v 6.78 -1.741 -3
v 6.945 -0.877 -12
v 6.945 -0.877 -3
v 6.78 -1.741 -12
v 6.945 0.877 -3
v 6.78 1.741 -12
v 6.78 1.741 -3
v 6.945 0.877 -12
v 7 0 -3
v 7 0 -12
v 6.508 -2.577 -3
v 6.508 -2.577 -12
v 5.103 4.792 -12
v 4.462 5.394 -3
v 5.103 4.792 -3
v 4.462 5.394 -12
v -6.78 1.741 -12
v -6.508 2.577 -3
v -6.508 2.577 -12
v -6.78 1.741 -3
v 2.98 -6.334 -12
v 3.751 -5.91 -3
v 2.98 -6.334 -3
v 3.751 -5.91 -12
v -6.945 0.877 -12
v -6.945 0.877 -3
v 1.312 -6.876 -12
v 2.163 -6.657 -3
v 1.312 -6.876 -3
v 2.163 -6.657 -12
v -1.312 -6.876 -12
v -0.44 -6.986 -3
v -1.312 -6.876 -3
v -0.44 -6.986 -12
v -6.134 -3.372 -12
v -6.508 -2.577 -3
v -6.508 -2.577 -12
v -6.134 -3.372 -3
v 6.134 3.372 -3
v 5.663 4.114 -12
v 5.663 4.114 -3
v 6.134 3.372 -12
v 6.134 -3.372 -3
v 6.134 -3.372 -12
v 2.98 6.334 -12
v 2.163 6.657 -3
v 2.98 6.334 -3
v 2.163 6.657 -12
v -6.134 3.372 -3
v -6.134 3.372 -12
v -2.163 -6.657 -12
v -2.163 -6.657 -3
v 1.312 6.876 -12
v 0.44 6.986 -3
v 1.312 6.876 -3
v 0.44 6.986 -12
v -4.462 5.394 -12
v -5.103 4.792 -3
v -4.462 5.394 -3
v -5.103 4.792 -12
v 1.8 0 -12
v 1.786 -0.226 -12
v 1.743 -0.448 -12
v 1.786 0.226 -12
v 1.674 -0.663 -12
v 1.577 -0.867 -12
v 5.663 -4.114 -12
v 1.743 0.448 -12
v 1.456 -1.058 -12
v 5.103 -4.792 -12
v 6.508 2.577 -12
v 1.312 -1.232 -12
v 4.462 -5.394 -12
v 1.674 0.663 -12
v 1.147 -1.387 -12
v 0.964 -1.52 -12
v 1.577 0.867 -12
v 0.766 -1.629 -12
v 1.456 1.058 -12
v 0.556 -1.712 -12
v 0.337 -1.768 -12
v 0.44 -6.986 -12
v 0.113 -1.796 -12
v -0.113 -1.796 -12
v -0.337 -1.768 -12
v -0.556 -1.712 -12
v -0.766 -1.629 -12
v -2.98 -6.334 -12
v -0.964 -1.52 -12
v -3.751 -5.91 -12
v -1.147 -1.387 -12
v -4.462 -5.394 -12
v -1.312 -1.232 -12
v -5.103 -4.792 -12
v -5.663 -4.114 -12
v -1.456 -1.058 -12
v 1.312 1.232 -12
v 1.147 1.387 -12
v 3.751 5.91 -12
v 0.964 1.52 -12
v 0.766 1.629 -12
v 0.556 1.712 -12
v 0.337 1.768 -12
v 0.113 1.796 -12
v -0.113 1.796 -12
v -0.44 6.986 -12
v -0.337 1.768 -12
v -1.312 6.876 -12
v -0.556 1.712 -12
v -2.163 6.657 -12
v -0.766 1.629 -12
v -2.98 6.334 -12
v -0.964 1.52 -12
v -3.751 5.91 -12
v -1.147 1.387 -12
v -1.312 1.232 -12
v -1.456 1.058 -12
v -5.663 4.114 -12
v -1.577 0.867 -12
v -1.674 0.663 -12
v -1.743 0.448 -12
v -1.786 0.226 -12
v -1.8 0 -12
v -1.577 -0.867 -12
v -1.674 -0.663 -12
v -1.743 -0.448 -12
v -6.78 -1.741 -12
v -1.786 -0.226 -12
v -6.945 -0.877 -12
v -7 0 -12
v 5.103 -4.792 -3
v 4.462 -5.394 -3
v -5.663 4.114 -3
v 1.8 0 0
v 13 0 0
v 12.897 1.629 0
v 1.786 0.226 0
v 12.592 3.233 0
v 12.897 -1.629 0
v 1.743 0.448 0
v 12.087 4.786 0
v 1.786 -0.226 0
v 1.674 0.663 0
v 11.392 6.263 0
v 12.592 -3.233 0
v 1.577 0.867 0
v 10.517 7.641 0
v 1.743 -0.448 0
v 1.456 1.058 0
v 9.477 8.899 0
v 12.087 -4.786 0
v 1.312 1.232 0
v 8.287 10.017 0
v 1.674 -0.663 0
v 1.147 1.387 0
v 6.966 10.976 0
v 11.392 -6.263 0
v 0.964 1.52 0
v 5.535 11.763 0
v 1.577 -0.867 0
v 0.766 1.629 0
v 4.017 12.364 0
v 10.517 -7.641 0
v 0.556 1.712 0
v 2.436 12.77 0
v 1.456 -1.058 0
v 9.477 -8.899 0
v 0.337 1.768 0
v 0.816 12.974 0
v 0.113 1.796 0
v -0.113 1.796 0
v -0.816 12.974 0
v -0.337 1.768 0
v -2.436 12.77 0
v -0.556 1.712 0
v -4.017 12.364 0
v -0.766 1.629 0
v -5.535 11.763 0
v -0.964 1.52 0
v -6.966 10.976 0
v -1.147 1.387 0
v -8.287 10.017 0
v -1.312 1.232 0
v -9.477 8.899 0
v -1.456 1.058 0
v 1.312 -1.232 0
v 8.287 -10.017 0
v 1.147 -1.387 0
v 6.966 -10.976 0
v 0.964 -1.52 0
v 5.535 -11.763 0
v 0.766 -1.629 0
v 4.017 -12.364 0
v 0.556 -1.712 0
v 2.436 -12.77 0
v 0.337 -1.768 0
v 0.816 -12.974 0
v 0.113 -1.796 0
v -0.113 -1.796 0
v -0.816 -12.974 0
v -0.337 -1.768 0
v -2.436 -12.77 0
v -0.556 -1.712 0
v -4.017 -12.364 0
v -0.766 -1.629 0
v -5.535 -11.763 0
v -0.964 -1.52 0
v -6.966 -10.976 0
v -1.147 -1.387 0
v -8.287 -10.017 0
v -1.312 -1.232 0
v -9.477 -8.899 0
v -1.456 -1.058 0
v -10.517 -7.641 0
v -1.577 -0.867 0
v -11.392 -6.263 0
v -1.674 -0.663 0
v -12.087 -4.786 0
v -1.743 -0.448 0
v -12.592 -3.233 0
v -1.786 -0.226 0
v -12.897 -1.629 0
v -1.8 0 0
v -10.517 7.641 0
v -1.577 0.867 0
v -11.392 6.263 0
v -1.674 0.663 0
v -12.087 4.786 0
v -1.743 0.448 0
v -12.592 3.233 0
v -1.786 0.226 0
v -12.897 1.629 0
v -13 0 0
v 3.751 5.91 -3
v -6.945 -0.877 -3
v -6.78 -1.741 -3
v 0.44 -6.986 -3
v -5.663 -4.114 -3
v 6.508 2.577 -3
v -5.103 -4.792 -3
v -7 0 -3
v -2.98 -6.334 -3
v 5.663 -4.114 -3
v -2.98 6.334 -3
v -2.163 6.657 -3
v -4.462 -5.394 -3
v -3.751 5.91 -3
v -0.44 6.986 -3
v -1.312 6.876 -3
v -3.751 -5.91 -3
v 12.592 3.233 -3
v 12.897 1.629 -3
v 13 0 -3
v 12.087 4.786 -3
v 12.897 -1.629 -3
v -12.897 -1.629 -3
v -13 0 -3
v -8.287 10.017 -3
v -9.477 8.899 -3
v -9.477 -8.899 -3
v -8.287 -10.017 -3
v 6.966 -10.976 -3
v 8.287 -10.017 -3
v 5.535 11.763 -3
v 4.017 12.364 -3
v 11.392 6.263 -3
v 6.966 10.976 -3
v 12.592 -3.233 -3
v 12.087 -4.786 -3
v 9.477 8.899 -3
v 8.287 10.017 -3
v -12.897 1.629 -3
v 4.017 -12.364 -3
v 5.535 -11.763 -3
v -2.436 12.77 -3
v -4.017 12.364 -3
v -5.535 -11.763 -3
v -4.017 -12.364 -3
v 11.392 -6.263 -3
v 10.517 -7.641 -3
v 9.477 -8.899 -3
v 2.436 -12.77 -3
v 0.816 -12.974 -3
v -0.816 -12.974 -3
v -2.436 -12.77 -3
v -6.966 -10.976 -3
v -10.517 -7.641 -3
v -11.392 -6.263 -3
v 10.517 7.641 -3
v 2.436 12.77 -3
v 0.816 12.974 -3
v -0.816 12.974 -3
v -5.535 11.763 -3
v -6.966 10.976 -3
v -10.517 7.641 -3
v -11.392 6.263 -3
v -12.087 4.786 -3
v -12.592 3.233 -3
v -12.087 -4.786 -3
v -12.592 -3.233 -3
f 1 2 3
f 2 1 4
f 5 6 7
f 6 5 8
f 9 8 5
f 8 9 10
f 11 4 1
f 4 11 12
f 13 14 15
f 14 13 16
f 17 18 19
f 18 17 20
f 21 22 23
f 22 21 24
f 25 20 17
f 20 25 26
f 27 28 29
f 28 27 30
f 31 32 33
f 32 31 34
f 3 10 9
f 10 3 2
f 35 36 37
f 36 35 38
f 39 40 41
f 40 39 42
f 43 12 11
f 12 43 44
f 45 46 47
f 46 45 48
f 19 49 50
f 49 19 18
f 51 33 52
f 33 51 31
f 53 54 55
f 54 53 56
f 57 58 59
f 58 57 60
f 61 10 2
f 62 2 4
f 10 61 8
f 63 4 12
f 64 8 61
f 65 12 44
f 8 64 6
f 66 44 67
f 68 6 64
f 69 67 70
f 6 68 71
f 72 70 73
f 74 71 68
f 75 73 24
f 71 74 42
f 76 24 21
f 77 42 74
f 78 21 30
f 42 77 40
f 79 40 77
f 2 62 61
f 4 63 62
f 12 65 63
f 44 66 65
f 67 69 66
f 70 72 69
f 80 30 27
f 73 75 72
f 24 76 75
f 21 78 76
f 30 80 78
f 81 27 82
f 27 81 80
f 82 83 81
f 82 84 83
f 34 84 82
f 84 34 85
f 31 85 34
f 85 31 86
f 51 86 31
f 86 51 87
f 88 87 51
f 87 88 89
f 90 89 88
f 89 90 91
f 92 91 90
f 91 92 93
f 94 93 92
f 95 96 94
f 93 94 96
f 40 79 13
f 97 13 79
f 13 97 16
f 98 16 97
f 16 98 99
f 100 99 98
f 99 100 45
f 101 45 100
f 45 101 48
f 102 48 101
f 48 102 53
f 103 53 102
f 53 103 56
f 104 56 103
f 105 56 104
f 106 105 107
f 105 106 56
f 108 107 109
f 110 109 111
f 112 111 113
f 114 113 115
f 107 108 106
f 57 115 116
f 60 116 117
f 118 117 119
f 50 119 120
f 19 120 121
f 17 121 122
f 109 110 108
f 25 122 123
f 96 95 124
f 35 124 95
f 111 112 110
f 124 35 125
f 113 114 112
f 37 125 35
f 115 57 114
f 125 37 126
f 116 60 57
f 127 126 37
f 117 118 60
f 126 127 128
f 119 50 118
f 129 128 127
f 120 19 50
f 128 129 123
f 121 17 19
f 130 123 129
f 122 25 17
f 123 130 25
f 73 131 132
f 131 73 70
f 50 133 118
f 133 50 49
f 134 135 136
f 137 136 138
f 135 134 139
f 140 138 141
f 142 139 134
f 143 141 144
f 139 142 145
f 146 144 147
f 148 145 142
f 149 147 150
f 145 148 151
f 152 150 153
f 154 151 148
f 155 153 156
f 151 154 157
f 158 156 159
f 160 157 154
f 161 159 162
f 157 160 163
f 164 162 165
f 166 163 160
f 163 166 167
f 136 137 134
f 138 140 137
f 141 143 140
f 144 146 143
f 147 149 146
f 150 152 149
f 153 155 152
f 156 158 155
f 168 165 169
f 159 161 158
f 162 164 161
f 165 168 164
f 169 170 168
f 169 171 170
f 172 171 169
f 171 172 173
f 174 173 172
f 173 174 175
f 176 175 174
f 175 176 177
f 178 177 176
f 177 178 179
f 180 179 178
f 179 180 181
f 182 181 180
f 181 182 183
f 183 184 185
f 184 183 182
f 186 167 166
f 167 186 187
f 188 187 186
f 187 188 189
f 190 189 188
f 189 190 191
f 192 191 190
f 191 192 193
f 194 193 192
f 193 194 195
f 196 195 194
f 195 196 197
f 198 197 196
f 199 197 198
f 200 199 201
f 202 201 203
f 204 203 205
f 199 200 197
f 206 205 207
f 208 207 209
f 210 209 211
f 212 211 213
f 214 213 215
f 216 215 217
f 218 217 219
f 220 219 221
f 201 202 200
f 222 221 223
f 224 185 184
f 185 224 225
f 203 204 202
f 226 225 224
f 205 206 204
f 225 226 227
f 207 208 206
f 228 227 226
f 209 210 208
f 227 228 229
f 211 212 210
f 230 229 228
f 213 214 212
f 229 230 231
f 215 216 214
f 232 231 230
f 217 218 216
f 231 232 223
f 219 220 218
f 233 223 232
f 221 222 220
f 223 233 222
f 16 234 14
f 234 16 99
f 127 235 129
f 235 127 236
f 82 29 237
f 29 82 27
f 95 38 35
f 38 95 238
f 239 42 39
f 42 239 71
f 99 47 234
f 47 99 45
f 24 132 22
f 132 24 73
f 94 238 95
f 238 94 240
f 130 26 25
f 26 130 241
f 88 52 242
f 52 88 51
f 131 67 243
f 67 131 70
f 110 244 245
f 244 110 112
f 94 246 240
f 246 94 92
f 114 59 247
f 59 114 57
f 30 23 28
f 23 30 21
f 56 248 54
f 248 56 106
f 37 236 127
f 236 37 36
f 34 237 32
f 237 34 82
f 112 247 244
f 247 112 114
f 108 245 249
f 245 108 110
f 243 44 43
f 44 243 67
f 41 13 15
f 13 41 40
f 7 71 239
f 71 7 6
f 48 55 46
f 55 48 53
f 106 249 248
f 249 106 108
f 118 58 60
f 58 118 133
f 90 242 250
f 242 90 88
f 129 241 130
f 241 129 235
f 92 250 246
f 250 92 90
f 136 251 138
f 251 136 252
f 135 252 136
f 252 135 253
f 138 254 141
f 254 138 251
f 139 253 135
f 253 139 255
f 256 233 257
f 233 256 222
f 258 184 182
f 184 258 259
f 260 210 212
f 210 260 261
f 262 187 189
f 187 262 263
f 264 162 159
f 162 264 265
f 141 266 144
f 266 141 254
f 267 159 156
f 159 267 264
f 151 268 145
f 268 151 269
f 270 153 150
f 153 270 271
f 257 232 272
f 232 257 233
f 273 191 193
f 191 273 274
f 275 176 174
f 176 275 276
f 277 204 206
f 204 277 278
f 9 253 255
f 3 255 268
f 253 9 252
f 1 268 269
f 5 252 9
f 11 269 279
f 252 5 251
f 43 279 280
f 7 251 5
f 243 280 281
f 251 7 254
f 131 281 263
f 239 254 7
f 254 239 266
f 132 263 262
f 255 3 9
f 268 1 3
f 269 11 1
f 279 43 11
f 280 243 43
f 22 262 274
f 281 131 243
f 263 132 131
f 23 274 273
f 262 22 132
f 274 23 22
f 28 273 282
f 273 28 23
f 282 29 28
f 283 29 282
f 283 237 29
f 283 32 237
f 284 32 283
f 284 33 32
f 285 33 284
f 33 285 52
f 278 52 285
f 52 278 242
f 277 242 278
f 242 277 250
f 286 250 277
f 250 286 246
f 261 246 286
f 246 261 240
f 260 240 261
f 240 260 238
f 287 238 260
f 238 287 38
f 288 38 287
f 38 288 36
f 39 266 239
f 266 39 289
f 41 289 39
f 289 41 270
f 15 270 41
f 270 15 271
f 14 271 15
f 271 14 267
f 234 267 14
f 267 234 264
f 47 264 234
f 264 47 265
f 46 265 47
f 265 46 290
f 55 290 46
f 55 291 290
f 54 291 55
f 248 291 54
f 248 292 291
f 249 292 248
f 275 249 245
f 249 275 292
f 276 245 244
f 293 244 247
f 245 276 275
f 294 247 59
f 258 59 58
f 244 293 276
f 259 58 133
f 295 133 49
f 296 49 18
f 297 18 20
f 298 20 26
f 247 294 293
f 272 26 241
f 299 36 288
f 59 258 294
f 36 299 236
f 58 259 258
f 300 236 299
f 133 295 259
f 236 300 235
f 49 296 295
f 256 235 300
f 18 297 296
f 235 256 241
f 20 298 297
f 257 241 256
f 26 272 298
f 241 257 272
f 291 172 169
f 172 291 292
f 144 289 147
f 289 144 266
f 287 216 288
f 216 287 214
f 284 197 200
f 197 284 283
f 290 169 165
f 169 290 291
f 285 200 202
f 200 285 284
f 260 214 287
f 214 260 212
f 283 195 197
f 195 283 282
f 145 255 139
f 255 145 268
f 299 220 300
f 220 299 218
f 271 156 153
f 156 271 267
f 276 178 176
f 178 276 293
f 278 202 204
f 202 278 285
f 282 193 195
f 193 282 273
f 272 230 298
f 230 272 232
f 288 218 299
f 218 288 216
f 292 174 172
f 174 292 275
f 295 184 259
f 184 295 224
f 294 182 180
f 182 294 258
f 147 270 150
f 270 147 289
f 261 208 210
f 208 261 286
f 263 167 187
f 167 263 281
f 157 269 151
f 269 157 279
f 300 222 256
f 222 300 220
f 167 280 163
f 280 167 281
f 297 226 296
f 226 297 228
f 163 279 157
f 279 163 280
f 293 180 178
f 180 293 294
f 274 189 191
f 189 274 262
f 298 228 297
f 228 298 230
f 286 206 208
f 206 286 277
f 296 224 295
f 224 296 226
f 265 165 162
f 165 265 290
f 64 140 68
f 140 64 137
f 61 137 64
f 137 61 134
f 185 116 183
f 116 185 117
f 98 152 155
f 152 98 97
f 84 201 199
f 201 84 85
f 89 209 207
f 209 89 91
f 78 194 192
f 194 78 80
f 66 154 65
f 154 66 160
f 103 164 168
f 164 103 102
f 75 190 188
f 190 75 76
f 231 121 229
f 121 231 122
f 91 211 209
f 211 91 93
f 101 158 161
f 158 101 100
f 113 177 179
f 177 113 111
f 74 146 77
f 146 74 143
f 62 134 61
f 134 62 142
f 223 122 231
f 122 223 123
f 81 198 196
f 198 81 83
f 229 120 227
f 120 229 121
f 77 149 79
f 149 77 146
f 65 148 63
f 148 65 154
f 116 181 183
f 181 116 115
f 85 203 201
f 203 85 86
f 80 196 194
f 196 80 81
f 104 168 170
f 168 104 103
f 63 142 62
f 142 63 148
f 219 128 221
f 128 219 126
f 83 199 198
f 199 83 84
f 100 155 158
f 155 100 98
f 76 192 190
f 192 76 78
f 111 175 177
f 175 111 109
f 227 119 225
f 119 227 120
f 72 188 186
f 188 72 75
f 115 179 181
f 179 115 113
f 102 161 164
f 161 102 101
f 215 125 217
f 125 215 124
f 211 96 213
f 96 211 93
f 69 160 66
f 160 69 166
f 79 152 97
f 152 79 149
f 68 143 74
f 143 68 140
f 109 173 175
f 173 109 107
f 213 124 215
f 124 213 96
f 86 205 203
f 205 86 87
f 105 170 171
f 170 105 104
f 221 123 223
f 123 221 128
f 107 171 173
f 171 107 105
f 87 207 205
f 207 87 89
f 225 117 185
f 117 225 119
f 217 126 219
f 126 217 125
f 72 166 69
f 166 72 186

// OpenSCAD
$fn = 50;


difference() {
	union() {
		translate(v = [0, 0, -12.0000000000]) {
			cylinder(h = 12, r = 7.0000000000);
		}
		translate(v = [0, 0, -3.0000000000]) {
			cylinder(h = 3, r = 13.0000000000);
		}
	}
	union() {
		#translate(v = [0, 0, -12]) {
			cylinder(h = 12, r = 1.8000000000);
		}
	}
}
